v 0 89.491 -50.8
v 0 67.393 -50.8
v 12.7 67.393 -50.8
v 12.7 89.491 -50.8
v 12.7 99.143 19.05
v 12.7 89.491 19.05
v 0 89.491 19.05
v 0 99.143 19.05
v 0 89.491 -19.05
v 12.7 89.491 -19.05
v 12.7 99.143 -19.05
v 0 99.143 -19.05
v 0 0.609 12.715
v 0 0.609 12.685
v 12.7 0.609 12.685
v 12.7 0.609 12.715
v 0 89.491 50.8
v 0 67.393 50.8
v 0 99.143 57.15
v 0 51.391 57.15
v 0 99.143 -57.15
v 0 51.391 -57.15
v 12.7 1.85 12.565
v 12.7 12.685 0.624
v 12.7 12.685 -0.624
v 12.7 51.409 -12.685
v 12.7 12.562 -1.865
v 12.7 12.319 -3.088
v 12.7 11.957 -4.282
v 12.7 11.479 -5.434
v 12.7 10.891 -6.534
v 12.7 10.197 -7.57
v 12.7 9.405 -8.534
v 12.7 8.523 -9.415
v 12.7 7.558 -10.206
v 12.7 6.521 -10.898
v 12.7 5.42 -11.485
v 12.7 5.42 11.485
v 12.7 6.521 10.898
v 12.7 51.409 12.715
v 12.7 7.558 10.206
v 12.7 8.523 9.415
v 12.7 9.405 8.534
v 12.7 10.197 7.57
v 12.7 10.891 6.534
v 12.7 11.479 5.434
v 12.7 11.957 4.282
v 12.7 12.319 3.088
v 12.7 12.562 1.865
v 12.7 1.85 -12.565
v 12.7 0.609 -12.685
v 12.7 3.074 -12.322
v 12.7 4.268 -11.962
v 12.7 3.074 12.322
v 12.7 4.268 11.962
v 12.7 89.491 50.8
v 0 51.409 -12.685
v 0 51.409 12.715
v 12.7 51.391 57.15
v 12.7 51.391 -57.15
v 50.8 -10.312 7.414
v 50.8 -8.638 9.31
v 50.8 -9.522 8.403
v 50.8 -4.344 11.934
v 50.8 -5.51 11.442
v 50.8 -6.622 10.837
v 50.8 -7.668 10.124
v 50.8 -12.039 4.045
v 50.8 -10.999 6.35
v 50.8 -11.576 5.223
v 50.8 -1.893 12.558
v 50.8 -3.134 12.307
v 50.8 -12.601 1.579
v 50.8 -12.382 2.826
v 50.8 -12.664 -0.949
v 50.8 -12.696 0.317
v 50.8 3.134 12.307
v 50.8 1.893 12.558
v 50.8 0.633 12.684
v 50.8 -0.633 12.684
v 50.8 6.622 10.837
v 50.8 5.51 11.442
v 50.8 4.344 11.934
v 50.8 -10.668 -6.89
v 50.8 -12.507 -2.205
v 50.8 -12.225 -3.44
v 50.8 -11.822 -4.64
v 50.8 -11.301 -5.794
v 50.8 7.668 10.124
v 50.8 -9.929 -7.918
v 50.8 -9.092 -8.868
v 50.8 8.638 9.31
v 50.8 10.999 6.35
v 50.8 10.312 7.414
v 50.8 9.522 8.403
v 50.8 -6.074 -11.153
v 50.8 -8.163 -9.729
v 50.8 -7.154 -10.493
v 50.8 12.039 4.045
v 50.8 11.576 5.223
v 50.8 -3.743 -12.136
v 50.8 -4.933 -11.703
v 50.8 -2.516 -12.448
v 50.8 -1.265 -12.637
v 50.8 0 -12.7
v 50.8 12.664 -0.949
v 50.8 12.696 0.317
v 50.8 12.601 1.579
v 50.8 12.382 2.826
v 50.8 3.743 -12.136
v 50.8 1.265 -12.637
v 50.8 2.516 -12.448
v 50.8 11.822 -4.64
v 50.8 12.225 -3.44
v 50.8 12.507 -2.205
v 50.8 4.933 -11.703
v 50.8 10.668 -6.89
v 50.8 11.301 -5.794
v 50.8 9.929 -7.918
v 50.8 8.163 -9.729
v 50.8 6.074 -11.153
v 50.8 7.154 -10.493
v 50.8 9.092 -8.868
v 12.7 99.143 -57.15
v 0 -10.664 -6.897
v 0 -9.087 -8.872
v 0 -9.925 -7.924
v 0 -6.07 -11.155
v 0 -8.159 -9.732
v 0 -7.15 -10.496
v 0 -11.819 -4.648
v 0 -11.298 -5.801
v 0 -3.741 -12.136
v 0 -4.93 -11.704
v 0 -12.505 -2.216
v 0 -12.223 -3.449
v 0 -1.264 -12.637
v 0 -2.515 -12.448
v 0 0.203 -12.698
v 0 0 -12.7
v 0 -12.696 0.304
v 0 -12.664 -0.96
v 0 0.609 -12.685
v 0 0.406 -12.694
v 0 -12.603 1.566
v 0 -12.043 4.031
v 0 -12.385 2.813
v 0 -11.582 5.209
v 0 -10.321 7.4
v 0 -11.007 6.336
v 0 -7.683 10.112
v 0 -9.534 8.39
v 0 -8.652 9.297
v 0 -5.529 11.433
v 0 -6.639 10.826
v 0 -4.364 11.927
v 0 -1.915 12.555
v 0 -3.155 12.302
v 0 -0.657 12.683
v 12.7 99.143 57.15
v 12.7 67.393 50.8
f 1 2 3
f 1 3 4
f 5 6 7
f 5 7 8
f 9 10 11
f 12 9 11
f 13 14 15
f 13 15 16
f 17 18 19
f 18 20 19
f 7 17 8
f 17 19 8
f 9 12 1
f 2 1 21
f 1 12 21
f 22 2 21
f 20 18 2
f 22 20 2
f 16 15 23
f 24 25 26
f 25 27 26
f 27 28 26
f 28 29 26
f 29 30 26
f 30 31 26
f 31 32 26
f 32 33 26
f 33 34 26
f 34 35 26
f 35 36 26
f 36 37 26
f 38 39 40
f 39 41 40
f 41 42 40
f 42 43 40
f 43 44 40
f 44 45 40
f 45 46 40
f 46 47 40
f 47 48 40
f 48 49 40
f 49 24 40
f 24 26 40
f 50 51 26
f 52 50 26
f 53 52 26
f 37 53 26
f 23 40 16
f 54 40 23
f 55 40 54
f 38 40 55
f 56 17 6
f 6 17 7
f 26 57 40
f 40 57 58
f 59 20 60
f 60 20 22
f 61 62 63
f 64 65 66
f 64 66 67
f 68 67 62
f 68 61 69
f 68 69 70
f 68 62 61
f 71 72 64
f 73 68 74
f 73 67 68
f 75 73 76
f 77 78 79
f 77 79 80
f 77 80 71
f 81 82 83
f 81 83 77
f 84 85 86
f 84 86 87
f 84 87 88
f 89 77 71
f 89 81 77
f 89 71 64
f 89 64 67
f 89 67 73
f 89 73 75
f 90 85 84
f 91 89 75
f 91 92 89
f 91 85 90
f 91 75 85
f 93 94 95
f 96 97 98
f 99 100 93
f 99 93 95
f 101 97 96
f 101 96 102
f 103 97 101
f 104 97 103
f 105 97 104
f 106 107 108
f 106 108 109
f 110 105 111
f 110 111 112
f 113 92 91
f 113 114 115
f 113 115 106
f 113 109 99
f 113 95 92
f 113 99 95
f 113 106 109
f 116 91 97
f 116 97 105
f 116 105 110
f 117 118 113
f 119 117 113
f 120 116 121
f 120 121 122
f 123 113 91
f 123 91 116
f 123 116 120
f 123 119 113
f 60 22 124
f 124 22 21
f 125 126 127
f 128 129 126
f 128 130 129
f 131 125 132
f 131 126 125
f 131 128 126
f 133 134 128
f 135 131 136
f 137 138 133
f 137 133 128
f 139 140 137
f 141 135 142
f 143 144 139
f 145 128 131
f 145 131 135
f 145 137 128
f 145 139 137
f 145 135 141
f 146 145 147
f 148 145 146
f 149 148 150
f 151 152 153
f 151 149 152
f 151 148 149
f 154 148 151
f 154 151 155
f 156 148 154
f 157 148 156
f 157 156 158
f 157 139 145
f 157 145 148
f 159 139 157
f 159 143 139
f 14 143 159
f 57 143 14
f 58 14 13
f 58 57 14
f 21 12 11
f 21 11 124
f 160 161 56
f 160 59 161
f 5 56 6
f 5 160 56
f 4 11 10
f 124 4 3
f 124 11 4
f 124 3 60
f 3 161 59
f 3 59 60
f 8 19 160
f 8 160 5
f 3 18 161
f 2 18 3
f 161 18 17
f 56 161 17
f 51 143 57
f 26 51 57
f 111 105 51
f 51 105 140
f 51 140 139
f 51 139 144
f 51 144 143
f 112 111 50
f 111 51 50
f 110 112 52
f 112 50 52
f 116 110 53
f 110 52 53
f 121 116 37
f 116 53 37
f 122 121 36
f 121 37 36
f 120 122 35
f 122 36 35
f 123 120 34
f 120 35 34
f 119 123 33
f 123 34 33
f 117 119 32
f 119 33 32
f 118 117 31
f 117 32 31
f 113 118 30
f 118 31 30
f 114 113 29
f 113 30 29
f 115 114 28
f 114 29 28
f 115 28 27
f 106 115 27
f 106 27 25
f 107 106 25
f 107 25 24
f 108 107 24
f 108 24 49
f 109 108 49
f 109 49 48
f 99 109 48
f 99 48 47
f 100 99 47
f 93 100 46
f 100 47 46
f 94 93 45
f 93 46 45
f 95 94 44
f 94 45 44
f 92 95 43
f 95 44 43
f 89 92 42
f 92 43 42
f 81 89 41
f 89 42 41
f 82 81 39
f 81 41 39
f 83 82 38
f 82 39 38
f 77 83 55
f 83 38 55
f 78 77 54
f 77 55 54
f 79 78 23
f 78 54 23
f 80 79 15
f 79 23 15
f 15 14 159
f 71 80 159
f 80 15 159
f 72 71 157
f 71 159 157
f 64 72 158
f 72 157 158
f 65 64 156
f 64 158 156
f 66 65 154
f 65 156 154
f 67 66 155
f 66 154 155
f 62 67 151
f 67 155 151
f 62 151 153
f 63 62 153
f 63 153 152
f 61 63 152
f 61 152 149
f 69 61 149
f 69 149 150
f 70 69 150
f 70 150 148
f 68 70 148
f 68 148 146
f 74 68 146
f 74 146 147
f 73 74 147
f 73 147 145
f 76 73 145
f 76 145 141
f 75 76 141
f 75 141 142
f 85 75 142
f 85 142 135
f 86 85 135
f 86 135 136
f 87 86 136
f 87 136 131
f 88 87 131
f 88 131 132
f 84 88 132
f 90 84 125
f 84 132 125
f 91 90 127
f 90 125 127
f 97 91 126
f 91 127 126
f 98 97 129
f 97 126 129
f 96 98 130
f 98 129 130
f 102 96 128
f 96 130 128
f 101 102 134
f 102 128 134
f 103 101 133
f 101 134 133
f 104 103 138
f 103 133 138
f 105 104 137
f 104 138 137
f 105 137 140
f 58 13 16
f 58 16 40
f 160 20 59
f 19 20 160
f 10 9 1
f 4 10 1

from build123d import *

# Parameters (mm, degrees)
SKETCH2_R           = 12.7
BOSS_EXTRUDE1_DEPTH = 50.8
SKETCH3_W           = 25.4
SKETCH3_H           = 50.8
BOSS_EXTRUDE2_DEPTH = 12.7
SKETCH5_W           = 101.6
SKETCH5_H           = 16.002
BOSS_EXTRUDE3_DEPTH = 12.7
SKETCH6_W           = 6.35
SKETCH6_H           = 38.1
BOSS_EXTRUDE4_DEPTH = 12.7
SKETCH7_W           = 38.1
SKETCH7_H           = 9.652
BOSS_EXTRUDE5_DEPTH = 12.7


with BuildPart() as part:
    # Sketch2 → Boss-Extrude1 (new body)
    with BuildSketch(Plane(origin=(0, 0, 0), x_dir=(0, 0, -1), z_dir=(1, 0, 0))):
        Circle(SKETCH2_R)
    extrude(amount=BOSS_EXTRUDE1_DEPTH)

    # Sketch3 → Boss-Extrude2 (add)
    with BuildSketch(Plane.ZY):
        with Locations((0.014597196, 26.008732875)):
            Rectangle(SKETCH3_W, SKETCH3_H)
    extrude(amount=-BOSS_EXTRUDE2_DEPTH)


with BuildPart() as body_2:
    # Sketch5 → Boss-Extrude3 (new body)
    with BuildSketch(Plane(origin=(0, 0, 0), x_dir=(0, 0, -1), z_dir=(1, 0, 0))):
        with Locations((0, 59.392294155)):
            Rectangle(SKETCH5_W, SKETCH5_H)
    extrude(amount=BOSS_EXTRUDE3_DEPTH)

    # Sketch6 → Boss-Extrude4 (add)
    with BuildSketch(Plane(origin=(0, 0, 0), x_dir=(0, 0, -1), z_dir=(1, 0, 0))):
        with Locations((-53.975, 70.441294155)):
            Rectangle(SKETCH6_W, SKETCH6_H)
        with Locations((53.975, 70.441294155)):
            Rectangle(SKETCH6_W, SKETCH6_H)
    extrude(amount=BOSS_EXTRUDE4_DEPTH)

    # Sketch7 → Boss-Extrude5 (add)
    with BuildSketch(Plane(origin=(0, 0, 0), x_dir=(0, 0, -1), z_dir=(1, 0, 0))):
        with Locations((-38.1, 94.317294155)):
            Rectangle(SKETCH7_W, SKETCH7_H)
        with Locations((38.1, 94.317294155)):
            Rectangle(SKETCH7_W, SKETCH7_H)
    extrude(amount=BOSS_EXTRUDE5_DEPTH)


solid = Compound([part.part, body_2.part])
